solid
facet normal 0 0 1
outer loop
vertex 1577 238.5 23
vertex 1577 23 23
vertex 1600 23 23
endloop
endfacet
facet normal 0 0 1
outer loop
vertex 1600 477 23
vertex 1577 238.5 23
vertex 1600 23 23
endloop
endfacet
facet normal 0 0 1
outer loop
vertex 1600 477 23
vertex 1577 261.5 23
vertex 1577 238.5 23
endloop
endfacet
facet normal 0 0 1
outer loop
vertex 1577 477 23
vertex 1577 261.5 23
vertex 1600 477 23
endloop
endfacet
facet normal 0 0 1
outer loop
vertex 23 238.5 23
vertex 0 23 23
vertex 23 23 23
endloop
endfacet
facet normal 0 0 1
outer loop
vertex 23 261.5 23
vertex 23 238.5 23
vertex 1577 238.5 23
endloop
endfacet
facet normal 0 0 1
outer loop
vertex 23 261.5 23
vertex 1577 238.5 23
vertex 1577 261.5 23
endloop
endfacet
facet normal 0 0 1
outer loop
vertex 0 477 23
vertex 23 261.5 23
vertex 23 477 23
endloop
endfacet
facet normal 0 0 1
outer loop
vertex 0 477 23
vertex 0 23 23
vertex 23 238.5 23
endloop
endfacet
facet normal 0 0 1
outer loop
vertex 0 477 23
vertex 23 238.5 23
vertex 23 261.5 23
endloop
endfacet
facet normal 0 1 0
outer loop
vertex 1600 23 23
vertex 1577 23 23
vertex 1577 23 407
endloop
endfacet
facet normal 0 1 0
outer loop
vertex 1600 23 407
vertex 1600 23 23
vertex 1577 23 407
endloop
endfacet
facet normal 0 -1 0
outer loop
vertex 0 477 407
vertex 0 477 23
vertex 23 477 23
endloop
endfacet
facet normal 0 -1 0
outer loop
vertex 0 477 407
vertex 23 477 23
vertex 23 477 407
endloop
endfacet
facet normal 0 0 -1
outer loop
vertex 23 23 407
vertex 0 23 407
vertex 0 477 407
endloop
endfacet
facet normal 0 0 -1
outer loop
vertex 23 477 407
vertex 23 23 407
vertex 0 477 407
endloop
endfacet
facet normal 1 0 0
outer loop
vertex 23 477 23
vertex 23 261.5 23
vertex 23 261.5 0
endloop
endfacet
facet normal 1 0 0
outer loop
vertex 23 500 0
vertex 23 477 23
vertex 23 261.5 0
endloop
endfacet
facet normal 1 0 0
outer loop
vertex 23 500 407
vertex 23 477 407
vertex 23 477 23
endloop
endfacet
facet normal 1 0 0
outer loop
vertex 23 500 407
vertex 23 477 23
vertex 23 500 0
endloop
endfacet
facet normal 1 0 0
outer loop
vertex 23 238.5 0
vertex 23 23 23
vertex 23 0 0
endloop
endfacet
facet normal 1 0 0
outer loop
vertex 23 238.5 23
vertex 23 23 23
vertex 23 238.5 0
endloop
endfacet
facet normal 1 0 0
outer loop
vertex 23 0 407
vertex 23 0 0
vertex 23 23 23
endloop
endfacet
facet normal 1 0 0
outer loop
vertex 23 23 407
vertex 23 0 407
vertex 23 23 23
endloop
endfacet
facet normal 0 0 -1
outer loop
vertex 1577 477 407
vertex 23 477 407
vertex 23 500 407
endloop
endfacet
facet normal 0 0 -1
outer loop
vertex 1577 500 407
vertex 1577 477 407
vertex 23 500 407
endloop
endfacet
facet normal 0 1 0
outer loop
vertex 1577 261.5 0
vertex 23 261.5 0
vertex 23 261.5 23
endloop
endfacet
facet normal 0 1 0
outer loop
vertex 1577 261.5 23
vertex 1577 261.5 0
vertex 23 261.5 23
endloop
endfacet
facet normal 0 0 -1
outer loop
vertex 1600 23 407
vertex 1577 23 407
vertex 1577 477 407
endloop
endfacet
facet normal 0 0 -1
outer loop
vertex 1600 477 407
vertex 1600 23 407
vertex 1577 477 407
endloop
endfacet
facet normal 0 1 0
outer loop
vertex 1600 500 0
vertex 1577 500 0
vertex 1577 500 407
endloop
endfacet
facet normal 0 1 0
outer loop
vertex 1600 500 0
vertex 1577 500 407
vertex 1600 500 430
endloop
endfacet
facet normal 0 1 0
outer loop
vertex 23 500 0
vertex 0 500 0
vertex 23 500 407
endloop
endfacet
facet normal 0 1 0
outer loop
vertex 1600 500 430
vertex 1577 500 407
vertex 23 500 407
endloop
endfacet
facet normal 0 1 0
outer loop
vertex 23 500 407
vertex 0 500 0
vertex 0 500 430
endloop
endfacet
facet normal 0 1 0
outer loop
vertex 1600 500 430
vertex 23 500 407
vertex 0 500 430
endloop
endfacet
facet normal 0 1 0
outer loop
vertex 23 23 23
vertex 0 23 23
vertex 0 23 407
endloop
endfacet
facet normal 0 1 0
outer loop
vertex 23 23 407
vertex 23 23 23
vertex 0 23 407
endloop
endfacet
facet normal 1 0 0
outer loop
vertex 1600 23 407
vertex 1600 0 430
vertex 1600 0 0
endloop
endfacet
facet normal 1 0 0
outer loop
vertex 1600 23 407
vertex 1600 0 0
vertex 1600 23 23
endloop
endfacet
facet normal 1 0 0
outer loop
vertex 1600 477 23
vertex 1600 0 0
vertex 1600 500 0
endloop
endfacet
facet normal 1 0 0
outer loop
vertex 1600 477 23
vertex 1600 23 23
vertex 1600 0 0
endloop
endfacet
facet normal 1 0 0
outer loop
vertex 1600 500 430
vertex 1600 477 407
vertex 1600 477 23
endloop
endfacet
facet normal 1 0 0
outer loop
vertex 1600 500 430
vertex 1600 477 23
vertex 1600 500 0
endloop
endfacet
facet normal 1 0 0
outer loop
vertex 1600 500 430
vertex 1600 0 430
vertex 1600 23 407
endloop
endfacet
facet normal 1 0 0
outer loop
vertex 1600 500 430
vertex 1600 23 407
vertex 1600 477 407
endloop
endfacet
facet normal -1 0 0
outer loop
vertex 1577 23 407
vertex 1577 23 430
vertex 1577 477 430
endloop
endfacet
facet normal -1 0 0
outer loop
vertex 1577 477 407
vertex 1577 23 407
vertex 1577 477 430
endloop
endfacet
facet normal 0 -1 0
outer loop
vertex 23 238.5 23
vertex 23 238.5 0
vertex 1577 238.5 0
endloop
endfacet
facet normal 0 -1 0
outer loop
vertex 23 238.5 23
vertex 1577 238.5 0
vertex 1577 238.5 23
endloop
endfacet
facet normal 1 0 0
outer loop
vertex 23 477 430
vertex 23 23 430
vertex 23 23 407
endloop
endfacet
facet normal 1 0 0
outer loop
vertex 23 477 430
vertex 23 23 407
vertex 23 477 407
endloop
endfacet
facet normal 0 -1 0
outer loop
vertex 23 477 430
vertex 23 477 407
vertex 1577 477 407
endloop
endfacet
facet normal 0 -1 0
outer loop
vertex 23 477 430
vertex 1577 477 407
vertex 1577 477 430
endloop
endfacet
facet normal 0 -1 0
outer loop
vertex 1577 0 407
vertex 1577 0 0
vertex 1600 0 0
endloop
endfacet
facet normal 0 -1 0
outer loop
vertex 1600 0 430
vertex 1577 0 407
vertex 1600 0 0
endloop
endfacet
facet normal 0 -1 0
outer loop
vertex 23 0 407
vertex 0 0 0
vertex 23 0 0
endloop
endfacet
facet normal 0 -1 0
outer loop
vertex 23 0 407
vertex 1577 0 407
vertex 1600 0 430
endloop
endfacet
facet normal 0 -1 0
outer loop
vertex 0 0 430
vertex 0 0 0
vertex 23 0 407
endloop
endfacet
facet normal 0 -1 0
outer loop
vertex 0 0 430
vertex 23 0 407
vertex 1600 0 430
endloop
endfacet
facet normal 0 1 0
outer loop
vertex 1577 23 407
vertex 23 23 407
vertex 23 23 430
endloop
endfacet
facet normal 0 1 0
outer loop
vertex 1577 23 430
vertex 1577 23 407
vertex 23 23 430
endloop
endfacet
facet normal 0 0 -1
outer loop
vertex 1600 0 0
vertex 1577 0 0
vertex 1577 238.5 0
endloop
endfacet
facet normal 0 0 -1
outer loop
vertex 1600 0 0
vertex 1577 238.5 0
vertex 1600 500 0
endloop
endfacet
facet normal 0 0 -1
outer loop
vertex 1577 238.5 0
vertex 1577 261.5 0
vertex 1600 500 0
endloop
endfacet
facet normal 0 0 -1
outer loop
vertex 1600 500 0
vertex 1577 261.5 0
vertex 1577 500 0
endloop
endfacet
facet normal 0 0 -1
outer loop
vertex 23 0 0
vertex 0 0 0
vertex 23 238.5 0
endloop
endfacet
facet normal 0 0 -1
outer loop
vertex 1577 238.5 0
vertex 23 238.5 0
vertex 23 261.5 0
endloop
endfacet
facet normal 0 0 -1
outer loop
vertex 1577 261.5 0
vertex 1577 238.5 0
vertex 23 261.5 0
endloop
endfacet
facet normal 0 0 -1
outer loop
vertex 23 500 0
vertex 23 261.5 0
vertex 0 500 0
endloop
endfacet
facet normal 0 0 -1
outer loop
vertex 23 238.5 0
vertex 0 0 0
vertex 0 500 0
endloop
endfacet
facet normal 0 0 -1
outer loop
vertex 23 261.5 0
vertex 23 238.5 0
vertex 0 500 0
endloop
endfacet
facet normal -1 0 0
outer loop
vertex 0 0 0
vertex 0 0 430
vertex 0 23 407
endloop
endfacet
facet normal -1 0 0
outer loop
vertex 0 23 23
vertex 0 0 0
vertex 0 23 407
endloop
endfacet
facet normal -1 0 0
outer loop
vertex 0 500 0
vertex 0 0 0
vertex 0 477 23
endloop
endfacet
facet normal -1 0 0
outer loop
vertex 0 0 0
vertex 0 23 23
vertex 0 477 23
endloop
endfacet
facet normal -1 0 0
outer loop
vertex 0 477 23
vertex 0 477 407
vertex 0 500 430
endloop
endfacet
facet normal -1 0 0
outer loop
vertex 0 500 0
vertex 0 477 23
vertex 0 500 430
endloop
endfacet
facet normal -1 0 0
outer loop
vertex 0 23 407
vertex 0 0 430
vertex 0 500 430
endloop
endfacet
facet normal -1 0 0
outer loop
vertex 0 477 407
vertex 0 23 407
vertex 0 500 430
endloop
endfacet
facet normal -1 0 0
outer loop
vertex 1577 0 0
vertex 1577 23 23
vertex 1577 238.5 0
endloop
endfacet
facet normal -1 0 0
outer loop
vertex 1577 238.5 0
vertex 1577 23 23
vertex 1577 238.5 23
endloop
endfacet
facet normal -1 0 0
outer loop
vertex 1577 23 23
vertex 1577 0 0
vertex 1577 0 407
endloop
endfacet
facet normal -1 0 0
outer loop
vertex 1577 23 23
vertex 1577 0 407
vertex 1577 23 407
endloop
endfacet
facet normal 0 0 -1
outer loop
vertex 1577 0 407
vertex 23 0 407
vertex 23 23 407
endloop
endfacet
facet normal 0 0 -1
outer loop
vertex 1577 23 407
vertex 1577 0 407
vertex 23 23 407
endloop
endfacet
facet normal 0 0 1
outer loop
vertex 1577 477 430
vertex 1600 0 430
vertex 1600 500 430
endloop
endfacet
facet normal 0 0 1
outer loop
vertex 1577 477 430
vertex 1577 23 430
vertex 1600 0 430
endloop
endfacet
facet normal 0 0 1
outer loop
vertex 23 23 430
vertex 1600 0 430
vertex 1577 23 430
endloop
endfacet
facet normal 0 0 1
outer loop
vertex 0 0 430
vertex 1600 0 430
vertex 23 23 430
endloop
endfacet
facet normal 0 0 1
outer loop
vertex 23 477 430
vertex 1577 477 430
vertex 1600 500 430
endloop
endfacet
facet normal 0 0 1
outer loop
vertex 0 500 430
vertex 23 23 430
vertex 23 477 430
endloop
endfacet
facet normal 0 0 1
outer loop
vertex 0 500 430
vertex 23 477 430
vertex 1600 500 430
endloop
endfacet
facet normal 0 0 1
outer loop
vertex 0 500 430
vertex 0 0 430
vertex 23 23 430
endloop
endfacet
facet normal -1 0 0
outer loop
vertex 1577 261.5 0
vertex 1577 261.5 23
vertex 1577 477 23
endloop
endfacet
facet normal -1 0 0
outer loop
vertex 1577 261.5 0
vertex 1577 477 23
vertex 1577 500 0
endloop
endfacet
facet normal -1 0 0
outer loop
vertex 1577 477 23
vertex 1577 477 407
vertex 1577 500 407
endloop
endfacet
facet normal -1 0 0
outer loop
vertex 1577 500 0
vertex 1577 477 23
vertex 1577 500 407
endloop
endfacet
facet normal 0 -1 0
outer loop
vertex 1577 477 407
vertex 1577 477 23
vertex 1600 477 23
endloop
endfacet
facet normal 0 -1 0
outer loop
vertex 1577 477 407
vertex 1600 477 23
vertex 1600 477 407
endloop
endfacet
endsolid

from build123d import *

# Parameters (mm, degrees)
SKETCH_W         = 500
SKETCH_H         = 430
SKETCH_W_2       = 454
SKETCH_H_2       = 384
EXTRUDE_DEPTH    = 23
SKETCH001_W      = 23
SKETCH001_H      = 23
EXTRUDE001_DEPTH = 1554


with BuildPart() as extrude_body:
    # Sketch → Extrude (new body)
    with BuildSketch(Plane.YZ):
        with Locations((250, 215)):
            Rectangle(SKETCH_W, SKETCH_H)
        with Locations((250, 215)):
            Rectangle(SKETCH_W_2, SKETCH_H_2, mode=Mode.SUBTRACT)
    extrude(amount=EXTRUDE_DEPTH)


with BuildPart() as extrude001:
    # Clone base: copy of Extrude body
    add(extrude_body.part)


with BuildPart() as extrude001_1:
    # Clone placement: moved
    add(extrude001.part.moved(Location((1577, 0, 0))))


with BuildPart() as extrude002:
    # Sketch001 → Extrude001 (new body)
    with BuildSketch(Plane.YZ):
        with Locations((11.5, 11.5)):
            Rectangle(SKETCH001_W, SKETCH001_H)
    extrude(amount=EXTRUDE001_DEPTH)


with BuildPart() as extrude002_1:
    # Extrude001 placement: moved
    add(extrude002.part.moved(Location((23, 238.5, 0))))


with BuildPart() as extrude003:
    # Clone001 base: copy of Extrude002
    add(extrude002_1.part)


with BuildPart() as extrude003_1:
    # Clone001 placement: moved
    add(extrude003.part.moved(Location((0, -238.5, 407))))


with BuildPart() as extrude004:
    # Clone002 base: copy of Extrude003
    add(extrude003_1.part)


with BuildPart() as extrude004_1:
    # Clone002 placement: moved
    add(extrude004.part.moved(Location((0, 477, 0))))


with BuildPart() as fusion:
    # Fusion base: copy of Extrude body
    add(extrude_body.part)

    # Fusion: union Extrude001, Extrude002, Extrude003, Extrude004
    add(extrude001_1.part)
    add(extrude002_1.part)
    add(extrude003_1.part)
    add(extrude004_1.part)


solid = fusion.part
